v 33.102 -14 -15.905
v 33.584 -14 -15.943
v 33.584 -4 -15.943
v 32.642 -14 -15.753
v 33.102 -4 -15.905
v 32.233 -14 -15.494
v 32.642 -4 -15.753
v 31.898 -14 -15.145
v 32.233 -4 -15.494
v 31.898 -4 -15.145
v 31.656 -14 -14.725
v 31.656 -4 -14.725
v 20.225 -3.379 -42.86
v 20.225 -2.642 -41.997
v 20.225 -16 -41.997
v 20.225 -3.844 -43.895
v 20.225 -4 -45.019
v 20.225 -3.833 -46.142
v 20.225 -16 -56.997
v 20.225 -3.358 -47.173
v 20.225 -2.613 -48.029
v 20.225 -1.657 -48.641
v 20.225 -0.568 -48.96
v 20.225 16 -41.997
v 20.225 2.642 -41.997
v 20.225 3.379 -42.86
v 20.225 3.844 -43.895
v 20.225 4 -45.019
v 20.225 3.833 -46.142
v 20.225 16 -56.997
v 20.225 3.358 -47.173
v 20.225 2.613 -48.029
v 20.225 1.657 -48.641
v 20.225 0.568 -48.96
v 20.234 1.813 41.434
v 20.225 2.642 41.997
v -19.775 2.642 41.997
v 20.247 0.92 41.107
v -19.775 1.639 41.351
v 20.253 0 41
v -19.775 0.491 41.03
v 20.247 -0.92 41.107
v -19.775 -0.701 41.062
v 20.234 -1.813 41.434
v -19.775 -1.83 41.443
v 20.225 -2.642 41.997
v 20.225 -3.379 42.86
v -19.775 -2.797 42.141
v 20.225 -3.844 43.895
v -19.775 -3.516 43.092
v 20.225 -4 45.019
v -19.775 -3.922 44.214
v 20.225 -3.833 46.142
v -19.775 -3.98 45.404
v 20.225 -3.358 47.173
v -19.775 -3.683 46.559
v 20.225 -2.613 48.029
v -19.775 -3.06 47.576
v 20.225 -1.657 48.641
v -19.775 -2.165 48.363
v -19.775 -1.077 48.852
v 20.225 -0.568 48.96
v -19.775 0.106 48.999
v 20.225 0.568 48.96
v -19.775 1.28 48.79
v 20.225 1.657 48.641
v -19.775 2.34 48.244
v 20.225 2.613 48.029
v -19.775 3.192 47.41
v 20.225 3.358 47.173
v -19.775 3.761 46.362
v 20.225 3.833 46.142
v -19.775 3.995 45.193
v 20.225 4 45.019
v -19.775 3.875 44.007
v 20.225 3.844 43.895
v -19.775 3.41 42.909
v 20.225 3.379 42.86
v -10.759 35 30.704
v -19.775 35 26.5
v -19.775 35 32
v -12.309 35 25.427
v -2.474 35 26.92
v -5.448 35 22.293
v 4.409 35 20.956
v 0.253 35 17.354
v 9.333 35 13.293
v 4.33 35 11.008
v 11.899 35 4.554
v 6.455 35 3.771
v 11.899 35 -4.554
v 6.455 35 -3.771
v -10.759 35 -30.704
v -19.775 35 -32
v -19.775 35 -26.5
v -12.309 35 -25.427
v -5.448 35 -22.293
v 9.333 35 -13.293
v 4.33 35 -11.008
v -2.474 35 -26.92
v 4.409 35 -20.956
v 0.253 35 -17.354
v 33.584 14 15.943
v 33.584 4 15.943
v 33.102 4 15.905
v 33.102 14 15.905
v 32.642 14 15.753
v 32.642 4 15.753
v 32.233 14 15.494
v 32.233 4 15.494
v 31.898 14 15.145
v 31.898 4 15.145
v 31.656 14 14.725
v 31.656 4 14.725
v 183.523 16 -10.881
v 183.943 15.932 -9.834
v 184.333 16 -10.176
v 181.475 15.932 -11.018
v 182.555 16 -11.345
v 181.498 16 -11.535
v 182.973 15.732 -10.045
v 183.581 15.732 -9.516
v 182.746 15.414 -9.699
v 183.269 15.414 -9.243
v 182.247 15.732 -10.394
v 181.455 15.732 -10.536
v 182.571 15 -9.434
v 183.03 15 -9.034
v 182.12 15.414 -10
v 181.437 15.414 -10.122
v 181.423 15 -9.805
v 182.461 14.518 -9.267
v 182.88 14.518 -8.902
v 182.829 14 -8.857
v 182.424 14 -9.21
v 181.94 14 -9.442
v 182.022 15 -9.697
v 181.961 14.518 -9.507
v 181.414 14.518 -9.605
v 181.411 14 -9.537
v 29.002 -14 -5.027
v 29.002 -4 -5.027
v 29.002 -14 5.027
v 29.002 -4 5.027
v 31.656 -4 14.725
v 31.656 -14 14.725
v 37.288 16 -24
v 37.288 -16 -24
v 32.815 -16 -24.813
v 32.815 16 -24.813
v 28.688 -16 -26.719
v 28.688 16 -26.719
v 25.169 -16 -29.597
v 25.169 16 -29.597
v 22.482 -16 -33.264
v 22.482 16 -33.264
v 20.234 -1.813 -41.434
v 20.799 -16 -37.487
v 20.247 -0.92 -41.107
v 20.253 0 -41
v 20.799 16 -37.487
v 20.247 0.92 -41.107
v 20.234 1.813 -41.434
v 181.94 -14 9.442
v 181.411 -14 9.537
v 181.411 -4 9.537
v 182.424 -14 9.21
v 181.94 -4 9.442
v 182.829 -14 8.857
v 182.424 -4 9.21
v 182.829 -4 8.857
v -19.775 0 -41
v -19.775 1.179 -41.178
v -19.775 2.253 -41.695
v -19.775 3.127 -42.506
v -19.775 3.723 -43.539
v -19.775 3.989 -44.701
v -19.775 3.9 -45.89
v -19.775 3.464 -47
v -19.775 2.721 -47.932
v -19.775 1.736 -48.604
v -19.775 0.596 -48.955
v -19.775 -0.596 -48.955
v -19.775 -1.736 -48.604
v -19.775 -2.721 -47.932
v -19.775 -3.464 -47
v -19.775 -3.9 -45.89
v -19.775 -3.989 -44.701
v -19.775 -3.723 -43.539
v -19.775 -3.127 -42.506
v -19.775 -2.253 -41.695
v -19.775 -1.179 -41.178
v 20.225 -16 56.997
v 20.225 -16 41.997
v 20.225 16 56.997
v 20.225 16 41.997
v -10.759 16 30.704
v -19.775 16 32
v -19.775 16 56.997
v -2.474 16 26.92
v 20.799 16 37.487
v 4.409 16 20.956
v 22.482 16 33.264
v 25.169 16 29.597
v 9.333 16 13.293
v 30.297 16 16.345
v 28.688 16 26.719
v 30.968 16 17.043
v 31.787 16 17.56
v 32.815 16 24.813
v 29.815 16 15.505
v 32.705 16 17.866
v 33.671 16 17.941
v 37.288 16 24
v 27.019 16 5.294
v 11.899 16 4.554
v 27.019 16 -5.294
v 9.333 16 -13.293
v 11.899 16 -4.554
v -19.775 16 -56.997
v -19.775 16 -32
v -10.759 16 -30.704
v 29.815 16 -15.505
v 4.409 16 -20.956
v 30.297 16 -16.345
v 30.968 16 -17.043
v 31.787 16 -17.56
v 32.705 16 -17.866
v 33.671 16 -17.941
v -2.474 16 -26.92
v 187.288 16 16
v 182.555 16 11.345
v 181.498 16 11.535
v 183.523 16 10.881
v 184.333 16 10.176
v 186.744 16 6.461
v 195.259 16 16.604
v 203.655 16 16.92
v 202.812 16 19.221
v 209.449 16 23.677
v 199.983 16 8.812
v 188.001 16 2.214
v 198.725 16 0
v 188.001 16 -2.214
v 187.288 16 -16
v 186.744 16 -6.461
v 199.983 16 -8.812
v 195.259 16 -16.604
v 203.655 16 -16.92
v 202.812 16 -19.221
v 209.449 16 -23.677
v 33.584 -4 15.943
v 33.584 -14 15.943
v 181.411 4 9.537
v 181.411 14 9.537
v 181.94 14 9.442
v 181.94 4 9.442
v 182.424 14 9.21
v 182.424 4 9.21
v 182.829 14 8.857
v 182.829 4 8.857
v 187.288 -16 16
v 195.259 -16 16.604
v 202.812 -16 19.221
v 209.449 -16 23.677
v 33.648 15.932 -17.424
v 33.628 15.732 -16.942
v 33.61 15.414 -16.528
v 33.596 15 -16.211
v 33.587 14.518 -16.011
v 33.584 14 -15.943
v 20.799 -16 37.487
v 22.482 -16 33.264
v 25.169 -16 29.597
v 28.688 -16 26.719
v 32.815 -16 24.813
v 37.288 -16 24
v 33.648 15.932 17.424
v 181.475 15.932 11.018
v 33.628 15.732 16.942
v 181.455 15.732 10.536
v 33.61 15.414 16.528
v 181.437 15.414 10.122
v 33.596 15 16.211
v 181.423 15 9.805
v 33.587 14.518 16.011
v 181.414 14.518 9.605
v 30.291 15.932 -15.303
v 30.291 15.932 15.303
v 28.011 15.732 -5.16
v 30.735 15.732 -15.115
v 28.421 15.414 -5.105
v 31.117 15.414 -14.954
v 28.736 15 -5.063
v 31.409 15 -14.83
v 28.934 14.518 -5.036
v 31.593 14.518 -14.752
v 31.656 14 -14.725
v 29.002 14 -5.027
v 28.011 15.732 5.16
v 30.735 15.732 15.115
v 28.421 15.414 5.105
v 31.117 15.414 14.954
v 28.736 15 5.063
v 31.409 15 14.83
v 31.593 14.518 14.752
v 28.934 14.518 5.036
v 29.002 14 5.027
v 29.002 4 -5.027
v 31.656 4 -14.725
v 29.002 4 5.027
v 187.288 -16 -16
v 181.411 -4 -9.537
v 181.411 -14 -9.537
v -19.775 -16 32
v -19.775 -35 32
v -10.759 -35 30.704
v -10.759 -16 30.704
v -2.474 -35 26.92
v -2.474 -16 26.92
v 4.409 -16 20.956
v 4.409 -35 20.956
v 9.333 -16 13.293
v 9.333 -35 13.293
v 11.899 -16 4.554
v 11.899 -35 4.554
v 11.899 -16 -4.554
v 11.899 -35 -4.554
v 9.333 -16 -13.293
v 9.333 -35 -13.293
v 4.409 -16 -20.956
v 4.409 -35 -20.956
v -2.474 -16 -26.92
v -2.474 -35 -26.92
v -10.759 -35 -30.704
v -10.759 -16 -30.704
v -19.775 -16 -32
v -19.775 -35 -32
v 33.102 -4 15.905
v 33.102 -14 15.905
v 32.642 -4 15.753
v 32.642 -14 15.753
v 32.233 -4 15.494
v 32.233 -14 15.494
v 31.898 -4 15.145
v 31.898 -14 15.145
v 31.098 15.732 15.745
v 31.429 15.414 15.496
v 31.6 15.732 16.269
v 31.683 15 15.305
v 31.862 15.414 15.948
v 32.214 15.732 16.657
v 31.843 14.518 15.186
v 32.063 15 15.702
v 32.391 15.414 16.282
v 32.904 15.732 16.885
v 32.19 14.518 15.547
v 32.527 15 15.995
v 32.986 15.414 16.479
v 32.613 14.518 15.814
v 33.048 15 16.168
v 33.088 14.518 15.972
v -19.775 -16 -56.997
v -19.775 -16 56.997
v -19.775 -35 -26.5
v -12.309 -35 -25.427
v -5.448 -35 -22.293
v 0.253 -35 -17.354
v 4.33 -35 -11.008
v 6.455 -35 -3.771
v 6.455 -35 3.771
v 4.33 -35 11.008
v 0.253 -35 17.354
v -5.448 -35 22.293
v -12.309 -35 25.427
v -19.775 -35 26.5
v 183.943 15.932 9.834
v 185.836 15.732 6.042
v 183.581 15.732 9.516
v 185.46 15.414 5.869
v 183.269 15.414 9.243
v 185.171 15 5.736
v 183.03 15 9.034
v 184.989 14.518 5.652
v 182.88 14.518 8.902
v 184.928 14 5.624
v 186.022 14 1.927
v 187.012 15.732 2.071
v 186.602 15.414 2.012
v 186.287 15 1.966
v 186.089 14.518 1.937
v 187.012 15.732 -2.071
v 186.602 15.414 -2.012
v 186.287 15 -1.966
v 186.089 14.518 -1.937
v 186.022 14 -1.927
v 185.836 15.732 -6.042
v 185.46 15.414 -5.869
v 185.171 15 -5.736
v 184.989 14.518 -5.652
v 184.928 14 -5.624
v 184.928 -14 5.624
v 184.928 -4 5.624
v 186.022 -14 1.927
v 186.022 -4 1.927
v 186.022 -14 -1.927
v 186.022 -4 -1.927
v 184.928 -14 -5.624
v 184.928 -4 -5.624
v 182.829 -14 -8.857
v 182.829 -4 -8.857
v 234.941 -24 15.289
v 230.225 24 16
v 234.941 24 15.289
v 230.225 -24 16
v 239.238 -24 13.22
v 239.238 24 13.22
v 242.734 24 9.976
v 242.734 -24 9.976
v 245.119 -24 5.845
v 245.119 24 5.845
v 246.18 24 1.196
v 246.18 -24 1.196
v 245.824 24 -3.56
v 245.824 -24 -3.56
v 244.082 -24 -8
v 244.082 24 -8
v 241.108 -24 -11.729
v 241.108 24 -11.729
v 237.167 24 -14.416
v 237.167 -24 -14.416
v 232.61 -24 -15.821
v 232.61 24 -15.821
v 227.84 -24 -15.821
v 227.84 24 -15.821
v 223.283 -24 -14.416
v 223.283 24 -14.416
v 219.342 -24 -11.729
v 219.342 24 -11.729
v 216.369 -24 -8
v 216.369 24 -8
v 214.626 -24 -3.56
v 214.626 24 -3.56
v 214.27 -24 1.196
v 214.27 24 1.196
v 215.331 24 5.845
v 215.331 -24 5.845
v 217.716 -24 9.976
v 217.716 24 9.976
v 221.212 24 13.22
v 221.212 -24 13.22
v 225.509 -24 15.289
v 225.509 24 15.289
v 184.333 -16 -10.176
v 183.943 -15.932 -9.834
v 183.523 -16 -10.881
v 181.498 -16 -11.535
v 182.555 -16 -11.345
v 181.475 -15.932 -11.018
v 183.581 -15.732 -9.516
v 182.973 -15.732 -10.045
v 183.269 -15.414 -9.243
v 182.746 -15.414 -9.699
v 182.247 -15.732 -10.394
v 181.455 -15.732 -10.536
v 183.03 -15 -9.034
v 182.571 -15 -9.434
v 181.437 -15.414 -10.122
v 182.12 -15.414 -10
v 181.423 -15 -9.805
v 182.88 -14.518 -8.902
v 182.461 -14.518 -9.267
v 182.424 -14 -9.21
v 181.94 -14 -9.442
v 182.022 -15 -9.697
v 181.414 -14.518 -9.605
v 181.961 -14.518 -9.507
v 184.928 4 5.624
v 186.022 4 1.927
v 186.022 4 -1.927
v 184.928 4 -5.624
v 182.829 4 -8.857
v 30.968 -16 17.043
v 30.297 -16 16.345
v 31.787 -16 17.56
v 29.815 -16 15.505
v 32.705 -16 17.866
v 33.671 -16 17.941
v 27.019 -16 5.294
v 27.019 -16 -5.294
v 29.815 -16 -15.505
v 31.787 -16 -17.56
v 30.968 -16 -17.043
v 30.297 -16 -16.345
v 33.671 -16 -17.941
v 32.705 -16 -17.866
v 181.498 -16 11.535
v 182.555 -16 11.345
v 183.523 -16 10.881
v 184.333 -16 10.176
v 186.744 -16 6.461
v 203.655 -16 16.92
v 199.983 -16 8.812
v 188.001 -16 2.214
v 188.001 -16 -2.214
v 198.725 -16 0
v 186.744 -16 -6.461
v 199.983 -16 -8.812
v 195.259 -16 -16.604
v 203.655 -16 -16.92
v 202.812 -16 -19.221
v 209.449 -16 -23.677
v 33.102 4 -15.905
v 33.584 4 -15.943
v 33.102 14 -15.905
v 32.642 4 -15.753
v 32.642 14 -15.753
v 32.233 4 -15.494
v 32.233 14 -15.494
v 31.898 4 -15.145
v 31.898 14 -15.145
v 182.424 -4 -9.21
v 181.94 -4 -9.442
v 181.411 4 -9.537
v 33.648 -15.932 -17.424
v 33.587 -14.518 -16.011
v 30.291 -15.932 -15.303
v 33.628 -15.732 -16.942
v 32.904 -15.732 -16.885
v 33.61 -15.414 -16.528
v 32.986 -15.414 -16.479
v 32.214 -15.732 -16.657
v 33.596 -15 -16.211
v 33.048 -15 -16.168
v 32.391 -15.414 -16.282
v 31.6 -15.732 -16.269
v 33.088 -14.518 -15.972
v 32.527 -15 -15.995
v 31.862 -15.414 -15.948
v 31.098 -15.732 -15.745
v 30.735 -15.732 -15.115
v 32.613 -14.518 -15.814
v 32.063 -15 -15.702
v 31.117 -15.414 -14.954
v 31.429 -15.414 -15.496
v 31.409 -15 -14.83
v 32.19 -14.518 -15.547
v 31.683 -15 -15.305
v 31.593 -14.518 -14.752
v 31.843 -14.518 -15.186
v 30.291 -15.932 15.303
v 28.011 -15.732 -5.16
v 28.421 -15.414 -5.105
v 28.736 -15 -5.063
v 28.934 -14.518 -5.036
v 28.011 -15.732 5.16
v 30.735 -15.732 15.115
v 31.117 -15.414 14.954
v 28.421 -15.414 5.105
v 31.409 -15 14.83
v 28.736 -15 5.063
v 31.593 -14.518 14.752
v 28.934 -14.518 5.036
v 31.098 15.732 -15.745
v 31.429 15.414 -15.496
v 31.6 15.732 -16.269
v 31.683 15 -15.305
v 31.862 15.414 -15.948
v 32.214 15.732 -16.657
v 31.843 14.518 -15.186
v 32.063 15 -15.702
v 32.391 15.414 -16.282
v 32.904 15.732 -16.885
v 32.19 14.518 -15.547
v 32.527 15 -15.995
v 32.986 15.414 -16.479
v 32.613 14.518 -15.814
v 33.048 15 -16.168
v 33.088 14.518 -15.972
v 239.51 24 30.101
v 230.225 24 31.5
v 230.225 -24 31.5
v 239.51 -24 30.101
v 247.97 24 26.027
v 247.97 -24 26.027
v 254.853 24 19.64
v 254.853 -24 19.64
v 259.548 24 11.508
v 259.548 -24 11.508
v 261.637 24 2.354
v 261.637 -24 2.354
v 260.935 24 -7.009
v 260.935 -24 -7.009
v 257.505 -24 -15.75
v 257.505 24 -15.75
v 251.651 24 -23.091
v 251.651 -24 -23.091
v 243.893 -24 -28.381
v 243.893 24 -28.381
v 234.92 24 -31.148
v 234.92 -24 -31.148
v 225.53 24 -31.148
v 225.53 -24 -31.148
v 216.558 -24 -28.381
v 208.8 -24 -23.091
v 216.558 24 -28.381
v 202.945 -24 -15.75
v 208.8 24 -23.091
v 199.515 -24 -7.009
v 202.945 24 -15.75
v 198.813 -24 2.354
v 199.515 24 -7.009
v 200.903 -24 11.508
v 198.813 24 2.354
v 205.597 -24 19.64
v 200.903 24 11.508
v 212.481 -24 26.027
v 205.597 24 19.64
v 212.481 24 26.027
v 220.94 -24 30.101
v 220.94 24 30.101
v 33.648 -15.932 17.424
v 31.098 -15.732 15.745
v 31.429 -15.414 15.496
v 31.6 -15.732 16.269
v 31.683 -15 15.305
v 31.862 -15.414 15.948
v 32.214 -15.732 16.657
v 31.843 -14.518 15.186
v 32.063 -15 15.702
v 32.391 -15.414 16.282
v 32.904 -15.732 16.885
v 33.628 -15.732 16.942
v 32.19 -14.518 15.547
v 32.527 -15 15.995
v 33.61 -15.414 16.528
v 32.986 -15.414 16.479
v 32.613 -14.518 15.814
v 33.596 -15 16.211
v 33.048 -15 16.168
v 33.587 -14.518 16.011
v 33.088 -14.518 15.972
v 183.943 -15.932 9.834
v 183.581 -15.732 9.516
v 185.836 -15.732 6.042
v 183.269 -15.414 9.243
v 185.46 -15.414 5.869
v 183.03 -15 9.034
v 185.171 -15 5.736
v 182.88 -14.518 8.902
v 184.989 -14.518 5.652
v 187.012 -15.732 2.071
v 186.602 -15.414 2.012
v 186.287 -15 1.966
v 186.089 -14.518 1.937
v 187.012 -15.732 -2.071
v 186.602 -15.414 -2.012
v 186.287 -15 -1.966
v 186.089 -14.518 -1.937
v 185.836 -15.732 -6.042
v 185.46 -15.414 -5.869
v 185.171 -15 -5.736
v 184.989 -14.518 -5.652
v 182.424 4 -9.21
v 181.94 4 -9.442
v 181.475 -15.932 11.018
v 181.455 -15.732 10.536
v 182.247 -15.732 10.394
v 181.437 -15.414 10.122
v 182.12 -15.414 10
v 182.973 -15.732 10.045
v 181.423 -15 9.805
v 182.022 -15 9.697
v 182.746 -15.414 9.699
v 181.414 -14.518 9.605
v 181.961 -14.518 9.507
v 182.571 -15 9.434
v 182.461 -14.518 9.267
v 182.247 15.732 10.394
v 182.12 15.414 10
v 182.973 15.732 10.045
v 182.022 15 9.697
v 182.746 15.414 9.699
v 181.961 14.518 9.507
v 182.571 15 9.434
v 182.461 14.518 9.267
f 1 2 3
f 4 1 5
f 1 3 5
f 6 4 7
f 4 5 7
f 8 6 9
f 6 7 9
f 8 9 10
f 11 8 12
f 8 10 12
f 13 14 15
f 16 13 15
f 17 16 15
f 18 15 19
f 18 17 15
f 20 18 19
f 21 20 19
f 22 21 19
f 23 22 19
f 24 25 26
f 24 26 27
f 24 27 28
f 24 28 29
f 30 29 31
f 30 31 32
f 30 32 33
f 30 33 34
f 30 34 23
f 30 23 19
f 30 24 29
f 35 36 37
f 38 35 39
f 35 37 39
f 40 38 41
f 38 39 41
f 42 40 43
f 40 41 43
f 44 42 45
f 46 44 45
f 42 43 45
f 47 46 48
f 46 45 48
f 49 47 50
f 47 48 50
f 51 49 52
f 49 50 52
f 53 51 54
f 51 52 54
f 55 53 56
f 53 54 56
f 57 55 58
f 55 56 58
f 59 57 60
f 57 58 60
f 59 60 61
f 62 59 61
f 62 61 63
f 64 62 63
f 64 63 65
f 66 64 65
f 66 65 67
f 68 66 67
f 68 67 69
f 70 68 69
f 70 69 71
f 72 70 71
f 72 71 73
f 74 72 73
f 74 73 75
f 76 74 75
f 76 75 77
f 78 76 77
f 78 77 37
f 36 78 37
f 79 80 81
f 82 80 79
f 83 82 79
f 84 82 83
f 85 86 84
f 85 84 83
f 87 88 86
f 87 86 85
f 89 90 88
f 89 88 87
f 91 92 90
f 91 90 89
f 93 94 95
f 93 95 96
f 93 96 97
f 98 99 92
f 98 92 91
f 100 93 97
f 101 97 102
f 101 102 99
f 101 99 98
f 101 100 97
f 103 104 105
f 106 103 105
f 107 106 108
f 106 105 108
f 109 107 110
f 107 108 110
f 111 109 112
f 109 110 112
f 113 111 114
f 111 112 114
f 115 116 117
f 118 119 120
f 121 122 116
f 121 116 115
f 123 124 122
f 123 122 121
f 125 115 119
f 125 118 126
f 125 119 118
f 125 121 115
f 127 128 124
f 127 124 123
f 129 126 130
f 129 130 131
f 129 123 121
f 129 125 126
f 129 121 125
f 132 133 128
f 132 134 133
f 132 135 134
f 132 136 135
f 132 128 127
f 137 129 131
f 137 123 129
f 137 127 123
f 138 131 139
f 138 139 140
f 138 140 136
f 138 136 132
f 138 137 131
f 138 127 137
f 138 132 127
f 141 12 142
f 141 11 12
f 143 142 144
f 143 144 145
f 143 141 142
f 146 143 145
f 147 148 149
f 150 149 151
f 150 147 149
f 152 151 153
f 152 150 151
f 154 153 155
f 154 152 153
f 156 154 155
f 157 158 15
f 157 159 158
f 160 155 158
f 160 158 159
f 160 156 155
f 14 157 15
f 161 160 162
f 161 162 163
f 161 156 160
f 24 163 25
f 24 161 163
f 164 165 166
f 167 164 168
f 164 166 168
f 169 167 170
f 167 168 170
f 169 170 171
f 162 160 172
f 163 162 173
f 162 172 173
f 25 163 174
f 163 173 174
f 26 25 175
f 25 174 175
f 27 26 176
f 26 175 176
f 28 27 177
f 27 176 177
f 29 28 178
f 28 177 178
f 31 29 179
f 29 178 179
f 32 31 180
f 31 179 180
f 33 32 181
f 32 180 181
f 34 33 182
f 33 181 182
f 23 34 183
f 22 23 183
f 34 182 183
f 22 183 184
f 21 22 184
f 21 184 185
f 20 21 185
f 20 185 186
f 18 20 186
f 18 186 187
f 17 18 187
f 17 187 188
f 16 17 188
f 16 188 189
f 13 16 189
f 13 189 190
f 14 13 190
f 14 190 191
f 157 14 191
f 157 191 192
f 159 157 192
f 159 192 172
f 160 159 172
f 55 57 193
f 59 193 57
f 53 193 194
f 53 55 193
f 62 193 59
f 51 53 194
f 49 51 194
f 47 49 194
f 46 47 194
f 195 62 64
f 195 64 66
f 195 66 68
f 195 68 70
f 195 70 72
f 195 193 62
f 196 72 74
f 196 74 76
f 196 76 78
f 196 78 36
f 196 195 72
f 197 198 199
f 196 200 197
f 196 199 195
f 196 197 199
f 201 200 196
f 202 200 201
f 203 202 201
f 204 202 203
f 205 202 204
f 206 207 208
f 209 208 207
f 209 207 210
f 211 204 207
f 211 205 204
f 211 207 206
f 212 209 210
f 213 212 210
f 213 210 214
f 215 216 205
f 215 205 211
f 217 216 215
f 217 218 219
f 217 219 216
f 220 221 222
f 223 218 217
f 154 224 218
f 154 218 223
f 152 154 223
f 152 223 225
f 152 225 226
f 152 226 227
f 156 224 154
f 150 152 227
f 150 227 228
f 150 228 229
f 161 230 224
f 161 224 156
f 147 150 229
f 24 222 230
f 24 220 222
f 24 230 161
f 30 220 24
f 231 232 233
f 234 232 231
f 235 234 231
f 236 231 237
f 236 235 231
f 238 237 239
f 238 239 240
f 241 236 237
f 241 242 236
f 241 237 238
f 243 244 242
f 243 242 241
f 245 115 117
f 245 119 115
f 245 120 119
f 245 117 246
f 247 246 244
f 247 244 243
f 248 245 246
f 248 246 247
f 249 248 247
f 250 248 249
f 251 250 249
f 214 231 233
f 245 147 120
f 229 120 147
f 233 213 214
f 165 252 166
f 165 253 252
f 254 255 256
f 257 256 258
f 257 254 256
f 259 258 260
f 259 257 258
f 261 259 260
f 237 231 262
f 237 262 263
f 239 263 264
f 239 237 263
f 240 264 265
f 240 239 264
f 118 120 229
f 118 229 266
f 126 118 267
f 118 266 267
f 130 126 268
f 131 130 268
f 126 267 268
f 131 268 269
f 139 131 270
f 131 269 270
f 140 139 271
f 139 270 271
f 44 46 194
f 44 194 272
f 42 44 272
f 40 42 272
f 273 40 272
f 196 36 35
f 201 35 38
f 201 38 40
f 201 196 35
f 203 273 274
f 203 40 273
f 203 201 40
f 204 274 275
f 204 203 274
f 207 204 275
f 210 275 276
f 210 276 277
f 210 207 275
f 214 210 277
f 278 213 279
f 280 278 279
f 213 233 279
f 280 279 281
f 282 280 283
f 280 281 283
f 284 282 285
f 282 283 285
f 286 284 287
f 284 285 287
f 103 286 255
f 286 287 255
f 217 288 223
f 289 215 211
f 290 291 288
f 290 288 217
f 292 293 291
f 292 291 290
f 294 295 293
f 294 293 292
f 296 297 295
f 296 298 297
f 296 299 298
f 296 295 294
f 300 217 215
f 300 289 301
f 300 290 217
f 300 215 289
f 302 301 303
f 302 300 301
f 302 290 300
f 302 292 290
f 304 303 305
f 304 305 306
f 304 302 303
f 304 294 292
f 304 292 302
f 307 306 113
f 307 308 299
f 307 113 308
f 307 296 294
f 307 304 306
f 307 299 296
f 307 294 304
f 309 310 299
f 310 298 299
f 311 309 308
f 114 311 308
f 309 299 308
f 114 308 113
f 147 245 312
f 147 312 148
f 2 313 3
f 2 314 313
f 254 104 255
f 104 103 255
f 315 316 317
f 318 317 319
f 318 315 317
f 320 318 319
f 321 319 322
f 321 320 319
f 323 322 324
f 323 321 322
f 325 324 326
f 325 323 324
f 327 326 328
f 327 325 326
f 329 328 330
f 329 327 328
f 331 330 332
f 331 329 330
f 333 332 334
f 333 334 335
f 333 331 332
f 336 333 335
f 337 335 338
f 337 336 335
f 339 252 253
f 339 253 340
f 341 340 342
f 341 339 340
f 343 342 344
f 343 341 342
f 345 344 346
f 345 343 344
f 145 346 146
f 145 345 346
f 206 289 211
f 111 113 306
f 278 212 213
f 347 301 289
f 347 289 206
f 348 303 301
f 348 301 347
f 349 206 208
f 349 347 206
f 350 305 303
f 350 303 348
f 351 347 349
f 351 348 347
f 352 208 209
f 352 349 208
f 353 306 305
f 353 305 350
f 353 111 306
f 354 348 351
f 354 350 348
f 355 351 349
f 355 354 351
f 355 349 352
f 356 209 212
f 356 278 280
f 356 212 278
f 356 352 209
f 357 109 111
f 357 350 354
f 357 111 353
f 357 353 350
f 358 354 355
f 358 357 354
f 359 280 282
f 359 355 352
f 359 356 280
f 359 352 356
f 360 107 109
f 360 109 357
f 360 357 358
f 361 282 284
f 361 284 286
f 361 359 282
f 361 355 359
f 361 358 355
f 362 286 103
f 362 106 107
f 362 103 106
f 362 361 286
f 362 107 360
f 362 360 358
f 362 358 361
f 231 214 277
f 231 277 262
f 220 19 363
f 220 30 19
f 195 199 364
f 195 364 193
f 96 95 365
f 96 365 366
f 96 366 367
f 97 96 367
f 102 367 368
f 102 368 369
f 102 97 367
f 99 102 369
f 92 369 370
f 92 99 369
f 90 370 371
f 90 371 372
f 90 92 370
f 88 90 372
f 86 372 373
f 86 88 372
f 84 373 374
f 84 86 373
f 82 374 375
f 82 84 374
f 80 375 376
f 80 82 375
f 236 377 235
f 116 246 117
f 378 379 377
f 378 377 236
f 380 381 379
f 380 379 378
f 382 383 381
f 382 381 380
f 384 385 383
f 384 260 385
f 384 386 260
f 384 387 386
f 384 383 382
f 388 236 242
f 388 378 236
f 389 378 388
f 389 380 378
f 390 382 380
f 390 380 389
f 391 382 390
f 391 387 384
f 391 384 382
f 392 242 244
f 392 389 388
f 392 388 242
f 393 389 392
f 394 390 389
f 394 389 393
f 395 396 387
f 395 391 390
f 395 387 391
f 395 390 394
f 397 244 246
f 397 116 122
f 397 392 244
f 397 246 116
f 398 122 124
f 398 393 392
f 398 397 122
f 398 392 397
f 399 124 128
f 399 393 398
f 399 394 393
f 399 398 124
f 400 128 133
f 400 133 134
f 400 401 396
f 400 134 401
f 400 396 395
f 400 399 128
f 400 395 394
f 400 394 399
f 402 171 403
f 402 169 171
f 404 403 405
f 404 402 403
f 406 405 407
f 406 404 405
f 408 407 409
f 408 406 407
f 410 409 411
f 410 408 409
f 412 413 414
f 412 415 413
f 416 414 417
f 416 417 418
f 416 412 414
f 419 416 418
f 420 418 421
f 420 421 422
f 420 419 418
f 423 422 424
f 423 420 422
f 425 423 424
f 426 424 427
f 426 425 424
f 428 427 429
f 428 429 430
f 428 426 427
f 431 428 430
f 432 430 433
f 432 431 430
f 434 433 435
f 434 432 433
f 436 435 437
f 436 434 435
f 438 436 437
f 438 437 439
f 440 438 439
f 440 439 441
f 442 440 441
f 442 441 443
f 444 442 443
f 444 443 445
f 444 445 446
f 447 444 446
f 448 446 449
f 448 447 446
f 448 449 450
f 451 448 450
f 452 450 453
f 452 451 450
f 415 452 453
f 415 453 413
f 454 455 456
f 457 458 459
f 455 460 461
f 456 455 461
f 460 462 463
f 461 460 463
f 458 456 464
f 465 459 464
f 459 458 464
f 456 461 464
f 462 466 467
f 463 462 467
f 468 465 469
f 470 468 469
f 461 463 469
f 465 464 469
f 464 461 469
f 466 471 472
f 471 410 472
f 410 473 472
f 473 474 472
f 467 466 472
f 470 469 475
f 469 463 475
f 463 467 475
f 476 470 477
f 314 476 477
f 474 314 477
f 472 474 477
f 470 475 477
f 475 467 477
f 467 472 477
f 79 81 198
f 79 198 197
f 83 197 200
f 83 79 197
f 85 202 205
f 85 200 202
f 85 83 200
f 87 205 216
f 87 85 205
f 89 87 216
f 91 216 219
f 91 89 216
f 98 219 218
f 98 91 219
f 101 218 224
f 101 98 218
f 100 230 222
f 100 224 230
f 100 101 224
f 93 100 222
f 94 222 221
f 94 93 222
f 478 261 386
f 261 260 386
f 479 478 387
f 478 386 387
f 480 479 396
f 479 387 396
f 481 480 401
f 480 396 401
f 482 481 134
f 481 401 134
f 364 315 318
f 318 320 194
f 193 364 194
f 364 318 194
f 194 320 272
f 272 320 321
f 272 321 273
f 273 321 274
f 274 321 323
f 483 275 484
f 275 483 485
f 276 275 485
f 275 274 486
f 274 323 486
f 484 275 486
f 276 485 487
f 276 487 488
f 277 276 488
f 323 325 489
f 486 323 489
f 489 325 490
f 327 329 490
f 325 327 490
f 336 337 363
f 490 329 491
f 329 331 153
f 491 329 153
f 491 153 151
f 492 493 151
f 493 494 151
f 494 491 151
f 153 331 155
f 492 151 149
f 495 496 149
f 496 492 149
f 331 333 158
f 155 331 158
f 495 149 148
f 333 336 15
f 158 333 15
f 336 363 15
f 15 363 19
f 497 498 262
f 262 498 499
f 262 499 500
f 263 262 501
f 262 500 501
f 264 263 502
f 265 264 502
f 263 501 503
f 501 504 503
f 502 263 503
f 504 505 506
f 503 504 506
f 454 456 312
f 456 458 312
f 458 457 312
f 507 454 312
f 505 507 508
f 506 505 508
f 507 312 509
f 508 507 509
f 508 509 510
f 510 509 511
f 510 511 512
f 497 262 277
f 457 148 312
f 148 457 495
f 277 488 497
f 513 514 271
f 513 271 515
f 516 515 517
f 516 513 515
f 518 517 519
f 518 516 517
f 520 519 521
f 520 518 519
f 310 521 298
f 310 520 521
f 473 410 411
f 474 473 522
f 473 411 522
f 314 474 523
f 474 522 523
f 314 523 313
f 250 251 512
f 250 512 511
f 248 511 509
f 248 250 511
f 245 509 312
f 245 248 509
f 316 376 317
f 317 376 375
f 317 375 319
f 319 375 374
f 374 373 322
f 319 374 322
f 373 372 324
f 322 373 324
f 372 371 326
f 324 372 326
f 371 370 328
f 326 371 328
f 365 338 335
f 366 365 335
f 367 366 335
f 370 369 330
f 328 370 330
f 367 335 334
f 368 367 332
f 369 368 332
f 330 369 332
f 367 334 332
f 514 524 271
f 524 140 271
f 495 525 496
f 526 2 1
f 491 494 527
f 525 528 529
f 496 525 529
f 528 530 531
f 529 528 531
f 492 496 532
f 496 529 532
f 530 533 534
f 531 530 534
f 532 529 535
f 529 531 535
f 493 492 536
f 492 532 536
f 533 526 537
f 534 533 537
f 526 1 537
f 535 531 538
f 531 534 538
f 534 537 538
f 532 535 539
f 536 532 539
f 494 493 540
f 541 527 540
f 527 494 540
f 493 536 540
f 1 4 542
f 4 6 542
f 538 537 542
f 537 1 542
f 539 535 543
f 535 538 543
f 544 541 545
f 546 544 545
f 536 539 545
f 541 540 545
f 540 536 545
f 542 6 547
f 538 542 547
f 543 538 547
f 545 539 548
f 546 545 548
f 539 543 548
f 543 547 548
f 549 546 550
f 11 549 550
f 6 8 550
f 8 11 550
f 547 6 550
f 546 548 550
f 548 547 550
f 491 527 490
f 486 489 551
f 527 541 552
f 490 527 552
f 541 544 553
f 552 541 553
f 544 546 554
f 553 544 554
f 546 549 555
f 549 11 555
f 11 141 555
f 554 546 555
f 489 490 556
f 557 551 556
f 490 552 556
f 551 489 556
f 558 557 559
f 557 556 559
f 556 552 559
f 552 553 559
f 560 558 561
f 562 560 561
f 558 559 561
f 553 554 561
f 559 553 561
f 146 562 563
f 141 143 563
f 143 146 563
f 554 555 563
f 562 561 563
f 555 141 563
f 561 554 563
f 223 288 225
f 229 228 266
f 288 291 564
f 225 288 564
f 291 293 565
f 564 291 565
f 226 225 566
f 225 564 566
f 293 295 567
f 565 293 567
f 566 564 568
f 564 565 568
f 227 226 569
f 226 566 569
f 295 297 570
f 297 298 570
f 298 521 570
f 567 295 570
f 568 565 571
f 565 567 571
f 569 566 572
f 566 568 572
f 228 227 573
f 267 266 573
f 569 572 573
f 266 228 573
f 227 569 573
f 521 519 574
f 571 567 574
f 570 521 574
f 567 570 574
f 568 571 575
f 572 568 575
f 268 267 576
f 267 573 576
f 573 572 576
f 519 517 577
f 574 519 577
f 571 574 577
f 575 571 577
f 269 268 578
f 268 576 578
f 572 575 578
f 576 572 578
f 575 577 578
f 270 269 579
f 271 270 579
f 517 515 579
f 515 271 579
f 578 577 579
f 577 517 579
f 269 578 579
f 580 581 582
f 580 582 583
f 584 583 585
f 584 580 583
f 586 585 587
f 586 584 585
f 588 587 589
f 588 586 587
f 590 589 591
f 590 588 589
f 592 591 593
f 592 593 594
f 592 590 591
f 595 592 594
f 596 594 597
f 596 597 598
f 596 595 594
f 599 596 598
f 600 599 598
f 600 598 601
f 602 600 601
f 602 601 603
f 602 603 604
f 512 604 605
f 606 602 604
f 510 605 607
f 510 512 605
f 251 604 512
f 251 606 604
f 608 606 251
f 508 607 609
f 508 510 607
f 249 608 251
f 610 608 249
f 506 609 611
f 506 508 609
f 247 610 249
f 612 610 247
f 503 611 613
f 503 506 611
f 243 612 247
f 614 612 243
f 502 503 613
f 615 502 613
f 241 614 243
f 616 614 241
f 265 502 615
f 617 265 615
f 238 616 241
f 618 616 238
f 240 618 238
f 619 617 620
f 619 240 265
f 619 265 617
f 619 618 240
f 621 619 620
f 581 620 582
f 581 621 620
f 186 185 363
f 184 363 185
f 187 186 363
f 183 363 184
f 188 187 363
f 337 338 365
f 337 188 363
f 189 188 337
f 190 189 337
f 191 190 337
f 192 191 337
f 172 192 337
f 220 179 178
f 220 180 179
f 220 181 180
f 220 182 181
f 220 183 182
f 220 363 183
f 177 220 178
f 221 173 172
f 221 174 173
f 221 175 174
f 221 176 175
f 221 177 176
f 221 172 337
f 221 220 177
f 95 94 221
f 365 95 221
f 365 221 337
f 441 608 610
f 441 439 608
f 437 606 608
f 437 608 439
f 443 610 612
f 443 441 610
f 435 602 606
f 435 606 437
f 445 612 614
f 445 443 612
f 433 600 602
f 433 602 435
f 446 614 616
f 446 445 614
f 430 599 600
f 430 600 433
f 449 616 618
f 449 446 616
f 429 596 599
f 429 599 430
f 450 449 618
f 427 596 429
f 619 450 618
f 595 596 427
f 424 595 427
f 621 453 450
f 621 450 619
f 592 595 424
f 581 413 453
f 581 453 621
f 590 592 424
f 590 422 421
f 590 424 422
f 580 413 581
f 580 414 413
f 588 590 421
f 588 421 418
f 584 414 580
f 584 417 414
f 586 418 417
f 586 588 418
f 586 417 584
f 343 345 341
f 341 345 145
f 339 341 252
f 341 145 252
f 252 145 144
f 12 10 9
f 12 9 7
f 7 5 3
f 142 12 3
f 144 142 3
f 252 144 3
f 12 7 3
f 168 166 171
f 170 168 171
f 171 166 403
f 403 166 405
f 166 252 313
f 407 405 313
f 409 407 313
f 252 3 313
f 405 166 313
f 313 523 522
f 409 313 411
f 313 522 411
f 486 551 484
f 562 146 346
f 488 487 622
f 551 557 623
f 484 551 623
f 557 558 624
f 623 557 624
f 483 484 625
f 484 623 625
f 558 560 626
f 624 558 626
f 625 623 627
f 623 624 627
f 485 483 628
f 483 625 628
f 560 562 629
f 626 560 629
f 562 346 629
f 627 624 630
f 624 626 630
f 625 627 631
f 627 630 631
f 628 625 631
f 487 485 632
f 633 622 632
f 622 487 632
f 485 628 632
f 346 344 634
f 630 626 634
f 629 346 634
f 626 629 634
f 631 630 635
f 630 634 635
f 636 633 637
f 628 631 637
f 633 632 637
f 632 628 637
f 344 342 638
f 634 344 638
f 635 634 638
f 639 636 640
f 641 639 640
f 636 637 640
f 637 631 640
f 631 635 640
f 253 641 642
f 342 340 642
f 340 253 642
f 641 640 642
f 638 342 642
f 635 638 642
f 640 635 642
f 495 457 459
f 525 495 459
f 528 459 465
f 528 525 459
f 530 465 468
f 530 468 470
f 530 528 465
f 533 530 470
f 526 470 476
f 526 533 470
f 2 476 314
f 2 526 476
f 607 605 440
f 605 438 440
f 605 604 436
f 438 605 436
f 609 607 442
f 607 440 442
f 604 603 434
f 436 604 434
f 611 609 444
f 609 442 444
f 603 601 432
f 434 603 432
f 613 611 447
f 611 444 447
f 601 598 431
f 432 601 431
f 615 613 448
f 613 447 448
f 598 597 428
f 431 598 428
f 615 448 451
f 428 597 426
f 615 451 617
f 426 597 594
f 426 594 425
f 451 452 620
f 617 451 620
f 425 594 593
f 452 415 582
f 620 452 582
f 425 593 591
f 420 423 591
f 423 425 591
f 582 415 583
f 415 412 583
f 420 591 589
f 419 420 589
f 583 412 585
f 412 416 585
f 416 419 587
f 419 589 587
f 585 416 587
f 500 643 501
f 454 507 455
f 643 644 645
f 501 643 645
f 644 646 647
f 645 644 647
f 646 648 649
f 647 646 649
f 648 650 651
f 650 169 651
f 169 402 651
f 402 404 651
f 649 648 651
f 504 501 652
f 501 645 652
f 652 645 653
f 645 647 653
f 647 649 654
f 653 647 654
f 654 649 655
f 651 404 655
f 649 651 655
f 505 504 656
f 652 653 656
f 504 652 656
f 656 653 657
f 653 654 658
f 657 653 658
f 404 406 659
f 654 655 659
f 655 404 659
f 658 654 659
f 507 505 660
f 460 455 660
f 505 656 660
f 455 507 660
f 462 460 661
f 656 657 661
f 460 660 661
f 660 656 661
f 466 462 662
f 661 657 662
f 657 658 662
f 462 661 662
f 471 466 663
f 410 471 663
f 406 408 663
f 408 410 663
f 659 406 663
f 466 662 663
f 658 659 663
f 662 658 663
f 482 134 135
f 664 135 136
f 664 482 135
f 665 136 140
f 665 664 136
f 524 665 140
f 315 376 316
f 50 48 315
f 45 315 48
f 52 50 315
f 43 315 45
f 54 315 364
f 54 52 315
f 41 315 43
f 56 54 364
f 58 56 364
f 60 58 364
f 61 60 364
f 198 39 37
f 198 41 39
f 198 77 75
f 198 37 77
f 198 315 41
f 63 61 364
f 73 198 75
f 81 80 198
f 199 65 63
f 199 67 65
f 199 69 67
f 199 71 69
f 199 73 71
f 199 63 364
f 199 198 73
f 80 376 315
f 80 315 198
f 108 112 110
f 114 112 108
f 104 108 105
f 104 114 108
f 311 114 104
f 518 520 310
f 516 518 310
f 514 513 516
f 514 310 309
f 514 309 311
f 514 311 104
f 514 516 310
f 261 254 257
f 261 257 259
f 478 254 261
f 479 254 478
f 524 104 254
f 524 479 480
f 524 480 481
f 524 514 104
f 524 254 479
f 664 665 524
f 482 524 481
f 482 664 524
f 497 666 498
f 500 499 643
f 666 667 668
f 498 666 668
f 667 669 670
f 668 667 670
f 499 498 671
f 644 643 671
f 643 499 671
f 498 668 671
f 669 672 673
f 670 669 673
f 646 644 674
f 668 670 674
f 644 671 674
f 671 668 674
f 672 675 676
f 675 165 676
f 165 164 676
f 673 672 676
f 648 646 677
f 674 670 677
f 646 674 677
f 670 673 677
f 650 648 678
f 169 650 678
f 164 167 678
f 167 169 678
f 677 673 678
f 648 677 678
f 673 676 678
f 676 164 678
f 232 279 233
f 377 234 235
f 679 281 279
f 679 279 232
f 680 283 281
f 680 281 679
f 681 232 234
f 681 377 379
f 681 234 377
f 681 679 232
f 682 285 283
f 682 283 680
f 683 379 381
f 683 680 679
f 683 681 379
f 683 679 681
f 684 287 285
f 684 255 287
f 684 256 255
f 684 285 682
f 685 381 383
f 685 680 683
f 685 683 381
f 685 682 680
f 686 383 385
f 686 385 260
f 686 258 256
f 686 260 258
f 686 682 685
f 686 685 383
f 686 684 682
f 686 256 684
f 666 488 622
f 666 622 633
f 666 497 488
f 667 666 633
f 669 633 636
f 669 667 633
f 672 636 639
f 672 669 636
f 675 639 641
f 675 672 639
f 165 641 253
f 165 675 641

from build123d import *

# Parameters (mm, degrees)
BOSS_EXTRUDE1_DEPTH = 16
SKETCH1_5_R         = 31.5
SKETCH1_5_R_2       = 16
BOSS_EXTRUDE2_DEPTH = 24
BOSS_EXTRUDE3_DEPTH = 35
CUT_EXTRUDE1_DEPTH  = 12
FILLET1_R           = 2
FILLET3_R           = 2
SKETCH6_R           = 4
CUT_EXTRUDE4_DEPTH  = 290.336969647


with BuildPart() as part:
    # Sketch1 → Boss-Extrude1 (new, symmetric)
    with BuildSketch(Plane(origin=(0, 0, 0), x_dir=(1, 0, 0), z_dir=(0, 1, 0))):
        with BuildLine():
            Line((-19.774827182, 56.996771876), (-19.774827182, 32))
            ThreePointArc((-19.774827182, 32), (12.225172818, 0), (-19.774827182, -32))
            Line((-19.774827182, -32), (-19.774827182, -56.996771876))
            Line((-19.774827182, -56.996771876), (20.225172818, -56.996771876))
            Line((20.225172818, -56.996771876), (20.225172818, -41.996771876))
            ThreePointArc((20.225172818, -41.996771876), (25.16884807, -29.597039719), (37.287694094, -24))
            Line((37.287694094, -24), (187.287694094, -16))
            ThreePointArc((187.287694094, -16), (199.120008212, -17.668601393), (209.448964206, -23.676975223))
            ThreePointArc((209.448964206, -23.676975223), (198.725172818, 0), (209.448964206, 23.676975223))
            ThreePointArc((209.448964206, 23.676975223), (199.120008212, 17.668601393), (187.287694094, 16))
            Line((187.287694094, 16), (37.287694094, 24))
            ThreePointArc((37.287694094, 24), (25.16884807, 29.597039719), (20.225172818, 41.996771876))
            Line((20.225172818, 41.996771876), (20.225172818, 56.996771876))
            Line((20.225172818, 56.996771876), (-19.774827182, 56.996771876))
        make_face()
    extrude(amount=BOSS_EXTRUDE1_DEPTH, both=True)

    # Sketch1_5 → Boss-Extrude2 (add, symmetric)
    with BuildSketch(Plane(origin=(0, 0, 0), x_dir=(1, 0, 0), z_dir=(0, 1, 0))):
        with Locations(Location((230.225172818, 0, 0), (0, 0, 270))):
            Circle(SKETCH1_5_R)
        with Locations(Location((230.225172818, 0, 0), (0, 0, 270))):
            Circle(SKETCH1_5_R_2, mode=Mode.SUBTRACT)
    extrude(amount=BOSS_EXTRUDE2_DEPTH, both=True)

    # Sketch1_6 → Boss-Extrude3 (add, symmetric)
    with BuildSketch(Plane(origin=(0, 0, 0), x_dir=(1, 0, 0), z_dir=(0, 1, 0))):
        with BuildLine():
            Line((-19.774827182, 32), (-19.774827182, 26.5))
            ThreePointArc((-19.774827182, 26.5), (6.725172818, 0), (-19.774827182, -26.5))
            Line((-19.774827182, -26.5), (-19.774827182, -32))
            ThreePointArc((-19.774827182, -32), (12.225172818, 0), (-19.774827182, 32))
        make_face()
    extrude(amount=BOSS_EXTRUDE3_DEPTH, both=True)

    # Sketch4 → Cut-Extrude1 (cut)
    with BuildSketch(Plane(origin=(0, 16, 0), x_dir=(1, 0, 0), z_dir=(0, 1, 0))):
        with BuildLine():
            Line((32.225172818, -16.001877998), (182.225172818, -9.501877998))
            ThreePointArc((182.225172818, -9.501877998), (186.160979553, 0), (182.225172818, 9.501877998))
            Line((182.225172818, 9.501877998), (32.225172818, 16.001877998))
            ThreePointArc((32.225172818, 16.001877998), (28.665381057, 0), (32.225172818, -16.001877998))
        make_face()
    cut_extrude1 = extrude(amount=-CUT_EXTRUDE1_DEPTH, mode=Mode.SUBTRACT)

    # Fillet1
    fillet1_edges = [part.edges().sort_by_distance(p)[0] for p in [
        (32.225172818, 10, 16.001877998),
        (32.225172818, 10, -16.001877998),
        (182.225172818, 10, -9.501877998),
        (182.225172818, 10, 9.501877998),
        (28.665381057, 16, 0),
        (107.225172818, 16, 12.751877998),
        (186.160979553, 16, 0),
        (107.225172818, 16, -12.751877998),
    ]]
    fillet(fillet1_edges, radius=FILLET1_R)

    # Mirror5: Cut-Extrude1 across plane
    add(cut_extrude1.mirror(Plane.ZX), mode=Mode.SUBTRACT)

    # Fillet3
    fillet3_edges = [part.edges().sort_by_distance(p)[0] for p in [
        (28.665381057, -16, 0),
        (32.225172818, -10, -16.001877998),
        (107.225172818, -16, 12.751877998),
        (32.225172818, -10, 16.001877998),
        (186.160979553, -16, 0),
        (182.225172818, -10, 9.501877998),
        (107.225172818, -16, -12.751877998),
        (182.225172818, -10, -9.501877998),
    ]]
    fillet(fillet3_edges, radius=FILLET3_R)

    # Sketch6 → Cut-Extrude4 (cut, through all)
    with BuildSketch(Plane.ZY.offset(19.774827182)):
        with Locations((-45, 0)):
            Circle(SKETCH6_R)
        with Locations(Location((45, 0, 0), (0, 0, 138.660333847))):
            Circle(SKETCH6_R)
    extrude(amount=-CUT_EXTRUDE4_DEPTH, mode=Mode.SUBTRACT)


solid = part.part
